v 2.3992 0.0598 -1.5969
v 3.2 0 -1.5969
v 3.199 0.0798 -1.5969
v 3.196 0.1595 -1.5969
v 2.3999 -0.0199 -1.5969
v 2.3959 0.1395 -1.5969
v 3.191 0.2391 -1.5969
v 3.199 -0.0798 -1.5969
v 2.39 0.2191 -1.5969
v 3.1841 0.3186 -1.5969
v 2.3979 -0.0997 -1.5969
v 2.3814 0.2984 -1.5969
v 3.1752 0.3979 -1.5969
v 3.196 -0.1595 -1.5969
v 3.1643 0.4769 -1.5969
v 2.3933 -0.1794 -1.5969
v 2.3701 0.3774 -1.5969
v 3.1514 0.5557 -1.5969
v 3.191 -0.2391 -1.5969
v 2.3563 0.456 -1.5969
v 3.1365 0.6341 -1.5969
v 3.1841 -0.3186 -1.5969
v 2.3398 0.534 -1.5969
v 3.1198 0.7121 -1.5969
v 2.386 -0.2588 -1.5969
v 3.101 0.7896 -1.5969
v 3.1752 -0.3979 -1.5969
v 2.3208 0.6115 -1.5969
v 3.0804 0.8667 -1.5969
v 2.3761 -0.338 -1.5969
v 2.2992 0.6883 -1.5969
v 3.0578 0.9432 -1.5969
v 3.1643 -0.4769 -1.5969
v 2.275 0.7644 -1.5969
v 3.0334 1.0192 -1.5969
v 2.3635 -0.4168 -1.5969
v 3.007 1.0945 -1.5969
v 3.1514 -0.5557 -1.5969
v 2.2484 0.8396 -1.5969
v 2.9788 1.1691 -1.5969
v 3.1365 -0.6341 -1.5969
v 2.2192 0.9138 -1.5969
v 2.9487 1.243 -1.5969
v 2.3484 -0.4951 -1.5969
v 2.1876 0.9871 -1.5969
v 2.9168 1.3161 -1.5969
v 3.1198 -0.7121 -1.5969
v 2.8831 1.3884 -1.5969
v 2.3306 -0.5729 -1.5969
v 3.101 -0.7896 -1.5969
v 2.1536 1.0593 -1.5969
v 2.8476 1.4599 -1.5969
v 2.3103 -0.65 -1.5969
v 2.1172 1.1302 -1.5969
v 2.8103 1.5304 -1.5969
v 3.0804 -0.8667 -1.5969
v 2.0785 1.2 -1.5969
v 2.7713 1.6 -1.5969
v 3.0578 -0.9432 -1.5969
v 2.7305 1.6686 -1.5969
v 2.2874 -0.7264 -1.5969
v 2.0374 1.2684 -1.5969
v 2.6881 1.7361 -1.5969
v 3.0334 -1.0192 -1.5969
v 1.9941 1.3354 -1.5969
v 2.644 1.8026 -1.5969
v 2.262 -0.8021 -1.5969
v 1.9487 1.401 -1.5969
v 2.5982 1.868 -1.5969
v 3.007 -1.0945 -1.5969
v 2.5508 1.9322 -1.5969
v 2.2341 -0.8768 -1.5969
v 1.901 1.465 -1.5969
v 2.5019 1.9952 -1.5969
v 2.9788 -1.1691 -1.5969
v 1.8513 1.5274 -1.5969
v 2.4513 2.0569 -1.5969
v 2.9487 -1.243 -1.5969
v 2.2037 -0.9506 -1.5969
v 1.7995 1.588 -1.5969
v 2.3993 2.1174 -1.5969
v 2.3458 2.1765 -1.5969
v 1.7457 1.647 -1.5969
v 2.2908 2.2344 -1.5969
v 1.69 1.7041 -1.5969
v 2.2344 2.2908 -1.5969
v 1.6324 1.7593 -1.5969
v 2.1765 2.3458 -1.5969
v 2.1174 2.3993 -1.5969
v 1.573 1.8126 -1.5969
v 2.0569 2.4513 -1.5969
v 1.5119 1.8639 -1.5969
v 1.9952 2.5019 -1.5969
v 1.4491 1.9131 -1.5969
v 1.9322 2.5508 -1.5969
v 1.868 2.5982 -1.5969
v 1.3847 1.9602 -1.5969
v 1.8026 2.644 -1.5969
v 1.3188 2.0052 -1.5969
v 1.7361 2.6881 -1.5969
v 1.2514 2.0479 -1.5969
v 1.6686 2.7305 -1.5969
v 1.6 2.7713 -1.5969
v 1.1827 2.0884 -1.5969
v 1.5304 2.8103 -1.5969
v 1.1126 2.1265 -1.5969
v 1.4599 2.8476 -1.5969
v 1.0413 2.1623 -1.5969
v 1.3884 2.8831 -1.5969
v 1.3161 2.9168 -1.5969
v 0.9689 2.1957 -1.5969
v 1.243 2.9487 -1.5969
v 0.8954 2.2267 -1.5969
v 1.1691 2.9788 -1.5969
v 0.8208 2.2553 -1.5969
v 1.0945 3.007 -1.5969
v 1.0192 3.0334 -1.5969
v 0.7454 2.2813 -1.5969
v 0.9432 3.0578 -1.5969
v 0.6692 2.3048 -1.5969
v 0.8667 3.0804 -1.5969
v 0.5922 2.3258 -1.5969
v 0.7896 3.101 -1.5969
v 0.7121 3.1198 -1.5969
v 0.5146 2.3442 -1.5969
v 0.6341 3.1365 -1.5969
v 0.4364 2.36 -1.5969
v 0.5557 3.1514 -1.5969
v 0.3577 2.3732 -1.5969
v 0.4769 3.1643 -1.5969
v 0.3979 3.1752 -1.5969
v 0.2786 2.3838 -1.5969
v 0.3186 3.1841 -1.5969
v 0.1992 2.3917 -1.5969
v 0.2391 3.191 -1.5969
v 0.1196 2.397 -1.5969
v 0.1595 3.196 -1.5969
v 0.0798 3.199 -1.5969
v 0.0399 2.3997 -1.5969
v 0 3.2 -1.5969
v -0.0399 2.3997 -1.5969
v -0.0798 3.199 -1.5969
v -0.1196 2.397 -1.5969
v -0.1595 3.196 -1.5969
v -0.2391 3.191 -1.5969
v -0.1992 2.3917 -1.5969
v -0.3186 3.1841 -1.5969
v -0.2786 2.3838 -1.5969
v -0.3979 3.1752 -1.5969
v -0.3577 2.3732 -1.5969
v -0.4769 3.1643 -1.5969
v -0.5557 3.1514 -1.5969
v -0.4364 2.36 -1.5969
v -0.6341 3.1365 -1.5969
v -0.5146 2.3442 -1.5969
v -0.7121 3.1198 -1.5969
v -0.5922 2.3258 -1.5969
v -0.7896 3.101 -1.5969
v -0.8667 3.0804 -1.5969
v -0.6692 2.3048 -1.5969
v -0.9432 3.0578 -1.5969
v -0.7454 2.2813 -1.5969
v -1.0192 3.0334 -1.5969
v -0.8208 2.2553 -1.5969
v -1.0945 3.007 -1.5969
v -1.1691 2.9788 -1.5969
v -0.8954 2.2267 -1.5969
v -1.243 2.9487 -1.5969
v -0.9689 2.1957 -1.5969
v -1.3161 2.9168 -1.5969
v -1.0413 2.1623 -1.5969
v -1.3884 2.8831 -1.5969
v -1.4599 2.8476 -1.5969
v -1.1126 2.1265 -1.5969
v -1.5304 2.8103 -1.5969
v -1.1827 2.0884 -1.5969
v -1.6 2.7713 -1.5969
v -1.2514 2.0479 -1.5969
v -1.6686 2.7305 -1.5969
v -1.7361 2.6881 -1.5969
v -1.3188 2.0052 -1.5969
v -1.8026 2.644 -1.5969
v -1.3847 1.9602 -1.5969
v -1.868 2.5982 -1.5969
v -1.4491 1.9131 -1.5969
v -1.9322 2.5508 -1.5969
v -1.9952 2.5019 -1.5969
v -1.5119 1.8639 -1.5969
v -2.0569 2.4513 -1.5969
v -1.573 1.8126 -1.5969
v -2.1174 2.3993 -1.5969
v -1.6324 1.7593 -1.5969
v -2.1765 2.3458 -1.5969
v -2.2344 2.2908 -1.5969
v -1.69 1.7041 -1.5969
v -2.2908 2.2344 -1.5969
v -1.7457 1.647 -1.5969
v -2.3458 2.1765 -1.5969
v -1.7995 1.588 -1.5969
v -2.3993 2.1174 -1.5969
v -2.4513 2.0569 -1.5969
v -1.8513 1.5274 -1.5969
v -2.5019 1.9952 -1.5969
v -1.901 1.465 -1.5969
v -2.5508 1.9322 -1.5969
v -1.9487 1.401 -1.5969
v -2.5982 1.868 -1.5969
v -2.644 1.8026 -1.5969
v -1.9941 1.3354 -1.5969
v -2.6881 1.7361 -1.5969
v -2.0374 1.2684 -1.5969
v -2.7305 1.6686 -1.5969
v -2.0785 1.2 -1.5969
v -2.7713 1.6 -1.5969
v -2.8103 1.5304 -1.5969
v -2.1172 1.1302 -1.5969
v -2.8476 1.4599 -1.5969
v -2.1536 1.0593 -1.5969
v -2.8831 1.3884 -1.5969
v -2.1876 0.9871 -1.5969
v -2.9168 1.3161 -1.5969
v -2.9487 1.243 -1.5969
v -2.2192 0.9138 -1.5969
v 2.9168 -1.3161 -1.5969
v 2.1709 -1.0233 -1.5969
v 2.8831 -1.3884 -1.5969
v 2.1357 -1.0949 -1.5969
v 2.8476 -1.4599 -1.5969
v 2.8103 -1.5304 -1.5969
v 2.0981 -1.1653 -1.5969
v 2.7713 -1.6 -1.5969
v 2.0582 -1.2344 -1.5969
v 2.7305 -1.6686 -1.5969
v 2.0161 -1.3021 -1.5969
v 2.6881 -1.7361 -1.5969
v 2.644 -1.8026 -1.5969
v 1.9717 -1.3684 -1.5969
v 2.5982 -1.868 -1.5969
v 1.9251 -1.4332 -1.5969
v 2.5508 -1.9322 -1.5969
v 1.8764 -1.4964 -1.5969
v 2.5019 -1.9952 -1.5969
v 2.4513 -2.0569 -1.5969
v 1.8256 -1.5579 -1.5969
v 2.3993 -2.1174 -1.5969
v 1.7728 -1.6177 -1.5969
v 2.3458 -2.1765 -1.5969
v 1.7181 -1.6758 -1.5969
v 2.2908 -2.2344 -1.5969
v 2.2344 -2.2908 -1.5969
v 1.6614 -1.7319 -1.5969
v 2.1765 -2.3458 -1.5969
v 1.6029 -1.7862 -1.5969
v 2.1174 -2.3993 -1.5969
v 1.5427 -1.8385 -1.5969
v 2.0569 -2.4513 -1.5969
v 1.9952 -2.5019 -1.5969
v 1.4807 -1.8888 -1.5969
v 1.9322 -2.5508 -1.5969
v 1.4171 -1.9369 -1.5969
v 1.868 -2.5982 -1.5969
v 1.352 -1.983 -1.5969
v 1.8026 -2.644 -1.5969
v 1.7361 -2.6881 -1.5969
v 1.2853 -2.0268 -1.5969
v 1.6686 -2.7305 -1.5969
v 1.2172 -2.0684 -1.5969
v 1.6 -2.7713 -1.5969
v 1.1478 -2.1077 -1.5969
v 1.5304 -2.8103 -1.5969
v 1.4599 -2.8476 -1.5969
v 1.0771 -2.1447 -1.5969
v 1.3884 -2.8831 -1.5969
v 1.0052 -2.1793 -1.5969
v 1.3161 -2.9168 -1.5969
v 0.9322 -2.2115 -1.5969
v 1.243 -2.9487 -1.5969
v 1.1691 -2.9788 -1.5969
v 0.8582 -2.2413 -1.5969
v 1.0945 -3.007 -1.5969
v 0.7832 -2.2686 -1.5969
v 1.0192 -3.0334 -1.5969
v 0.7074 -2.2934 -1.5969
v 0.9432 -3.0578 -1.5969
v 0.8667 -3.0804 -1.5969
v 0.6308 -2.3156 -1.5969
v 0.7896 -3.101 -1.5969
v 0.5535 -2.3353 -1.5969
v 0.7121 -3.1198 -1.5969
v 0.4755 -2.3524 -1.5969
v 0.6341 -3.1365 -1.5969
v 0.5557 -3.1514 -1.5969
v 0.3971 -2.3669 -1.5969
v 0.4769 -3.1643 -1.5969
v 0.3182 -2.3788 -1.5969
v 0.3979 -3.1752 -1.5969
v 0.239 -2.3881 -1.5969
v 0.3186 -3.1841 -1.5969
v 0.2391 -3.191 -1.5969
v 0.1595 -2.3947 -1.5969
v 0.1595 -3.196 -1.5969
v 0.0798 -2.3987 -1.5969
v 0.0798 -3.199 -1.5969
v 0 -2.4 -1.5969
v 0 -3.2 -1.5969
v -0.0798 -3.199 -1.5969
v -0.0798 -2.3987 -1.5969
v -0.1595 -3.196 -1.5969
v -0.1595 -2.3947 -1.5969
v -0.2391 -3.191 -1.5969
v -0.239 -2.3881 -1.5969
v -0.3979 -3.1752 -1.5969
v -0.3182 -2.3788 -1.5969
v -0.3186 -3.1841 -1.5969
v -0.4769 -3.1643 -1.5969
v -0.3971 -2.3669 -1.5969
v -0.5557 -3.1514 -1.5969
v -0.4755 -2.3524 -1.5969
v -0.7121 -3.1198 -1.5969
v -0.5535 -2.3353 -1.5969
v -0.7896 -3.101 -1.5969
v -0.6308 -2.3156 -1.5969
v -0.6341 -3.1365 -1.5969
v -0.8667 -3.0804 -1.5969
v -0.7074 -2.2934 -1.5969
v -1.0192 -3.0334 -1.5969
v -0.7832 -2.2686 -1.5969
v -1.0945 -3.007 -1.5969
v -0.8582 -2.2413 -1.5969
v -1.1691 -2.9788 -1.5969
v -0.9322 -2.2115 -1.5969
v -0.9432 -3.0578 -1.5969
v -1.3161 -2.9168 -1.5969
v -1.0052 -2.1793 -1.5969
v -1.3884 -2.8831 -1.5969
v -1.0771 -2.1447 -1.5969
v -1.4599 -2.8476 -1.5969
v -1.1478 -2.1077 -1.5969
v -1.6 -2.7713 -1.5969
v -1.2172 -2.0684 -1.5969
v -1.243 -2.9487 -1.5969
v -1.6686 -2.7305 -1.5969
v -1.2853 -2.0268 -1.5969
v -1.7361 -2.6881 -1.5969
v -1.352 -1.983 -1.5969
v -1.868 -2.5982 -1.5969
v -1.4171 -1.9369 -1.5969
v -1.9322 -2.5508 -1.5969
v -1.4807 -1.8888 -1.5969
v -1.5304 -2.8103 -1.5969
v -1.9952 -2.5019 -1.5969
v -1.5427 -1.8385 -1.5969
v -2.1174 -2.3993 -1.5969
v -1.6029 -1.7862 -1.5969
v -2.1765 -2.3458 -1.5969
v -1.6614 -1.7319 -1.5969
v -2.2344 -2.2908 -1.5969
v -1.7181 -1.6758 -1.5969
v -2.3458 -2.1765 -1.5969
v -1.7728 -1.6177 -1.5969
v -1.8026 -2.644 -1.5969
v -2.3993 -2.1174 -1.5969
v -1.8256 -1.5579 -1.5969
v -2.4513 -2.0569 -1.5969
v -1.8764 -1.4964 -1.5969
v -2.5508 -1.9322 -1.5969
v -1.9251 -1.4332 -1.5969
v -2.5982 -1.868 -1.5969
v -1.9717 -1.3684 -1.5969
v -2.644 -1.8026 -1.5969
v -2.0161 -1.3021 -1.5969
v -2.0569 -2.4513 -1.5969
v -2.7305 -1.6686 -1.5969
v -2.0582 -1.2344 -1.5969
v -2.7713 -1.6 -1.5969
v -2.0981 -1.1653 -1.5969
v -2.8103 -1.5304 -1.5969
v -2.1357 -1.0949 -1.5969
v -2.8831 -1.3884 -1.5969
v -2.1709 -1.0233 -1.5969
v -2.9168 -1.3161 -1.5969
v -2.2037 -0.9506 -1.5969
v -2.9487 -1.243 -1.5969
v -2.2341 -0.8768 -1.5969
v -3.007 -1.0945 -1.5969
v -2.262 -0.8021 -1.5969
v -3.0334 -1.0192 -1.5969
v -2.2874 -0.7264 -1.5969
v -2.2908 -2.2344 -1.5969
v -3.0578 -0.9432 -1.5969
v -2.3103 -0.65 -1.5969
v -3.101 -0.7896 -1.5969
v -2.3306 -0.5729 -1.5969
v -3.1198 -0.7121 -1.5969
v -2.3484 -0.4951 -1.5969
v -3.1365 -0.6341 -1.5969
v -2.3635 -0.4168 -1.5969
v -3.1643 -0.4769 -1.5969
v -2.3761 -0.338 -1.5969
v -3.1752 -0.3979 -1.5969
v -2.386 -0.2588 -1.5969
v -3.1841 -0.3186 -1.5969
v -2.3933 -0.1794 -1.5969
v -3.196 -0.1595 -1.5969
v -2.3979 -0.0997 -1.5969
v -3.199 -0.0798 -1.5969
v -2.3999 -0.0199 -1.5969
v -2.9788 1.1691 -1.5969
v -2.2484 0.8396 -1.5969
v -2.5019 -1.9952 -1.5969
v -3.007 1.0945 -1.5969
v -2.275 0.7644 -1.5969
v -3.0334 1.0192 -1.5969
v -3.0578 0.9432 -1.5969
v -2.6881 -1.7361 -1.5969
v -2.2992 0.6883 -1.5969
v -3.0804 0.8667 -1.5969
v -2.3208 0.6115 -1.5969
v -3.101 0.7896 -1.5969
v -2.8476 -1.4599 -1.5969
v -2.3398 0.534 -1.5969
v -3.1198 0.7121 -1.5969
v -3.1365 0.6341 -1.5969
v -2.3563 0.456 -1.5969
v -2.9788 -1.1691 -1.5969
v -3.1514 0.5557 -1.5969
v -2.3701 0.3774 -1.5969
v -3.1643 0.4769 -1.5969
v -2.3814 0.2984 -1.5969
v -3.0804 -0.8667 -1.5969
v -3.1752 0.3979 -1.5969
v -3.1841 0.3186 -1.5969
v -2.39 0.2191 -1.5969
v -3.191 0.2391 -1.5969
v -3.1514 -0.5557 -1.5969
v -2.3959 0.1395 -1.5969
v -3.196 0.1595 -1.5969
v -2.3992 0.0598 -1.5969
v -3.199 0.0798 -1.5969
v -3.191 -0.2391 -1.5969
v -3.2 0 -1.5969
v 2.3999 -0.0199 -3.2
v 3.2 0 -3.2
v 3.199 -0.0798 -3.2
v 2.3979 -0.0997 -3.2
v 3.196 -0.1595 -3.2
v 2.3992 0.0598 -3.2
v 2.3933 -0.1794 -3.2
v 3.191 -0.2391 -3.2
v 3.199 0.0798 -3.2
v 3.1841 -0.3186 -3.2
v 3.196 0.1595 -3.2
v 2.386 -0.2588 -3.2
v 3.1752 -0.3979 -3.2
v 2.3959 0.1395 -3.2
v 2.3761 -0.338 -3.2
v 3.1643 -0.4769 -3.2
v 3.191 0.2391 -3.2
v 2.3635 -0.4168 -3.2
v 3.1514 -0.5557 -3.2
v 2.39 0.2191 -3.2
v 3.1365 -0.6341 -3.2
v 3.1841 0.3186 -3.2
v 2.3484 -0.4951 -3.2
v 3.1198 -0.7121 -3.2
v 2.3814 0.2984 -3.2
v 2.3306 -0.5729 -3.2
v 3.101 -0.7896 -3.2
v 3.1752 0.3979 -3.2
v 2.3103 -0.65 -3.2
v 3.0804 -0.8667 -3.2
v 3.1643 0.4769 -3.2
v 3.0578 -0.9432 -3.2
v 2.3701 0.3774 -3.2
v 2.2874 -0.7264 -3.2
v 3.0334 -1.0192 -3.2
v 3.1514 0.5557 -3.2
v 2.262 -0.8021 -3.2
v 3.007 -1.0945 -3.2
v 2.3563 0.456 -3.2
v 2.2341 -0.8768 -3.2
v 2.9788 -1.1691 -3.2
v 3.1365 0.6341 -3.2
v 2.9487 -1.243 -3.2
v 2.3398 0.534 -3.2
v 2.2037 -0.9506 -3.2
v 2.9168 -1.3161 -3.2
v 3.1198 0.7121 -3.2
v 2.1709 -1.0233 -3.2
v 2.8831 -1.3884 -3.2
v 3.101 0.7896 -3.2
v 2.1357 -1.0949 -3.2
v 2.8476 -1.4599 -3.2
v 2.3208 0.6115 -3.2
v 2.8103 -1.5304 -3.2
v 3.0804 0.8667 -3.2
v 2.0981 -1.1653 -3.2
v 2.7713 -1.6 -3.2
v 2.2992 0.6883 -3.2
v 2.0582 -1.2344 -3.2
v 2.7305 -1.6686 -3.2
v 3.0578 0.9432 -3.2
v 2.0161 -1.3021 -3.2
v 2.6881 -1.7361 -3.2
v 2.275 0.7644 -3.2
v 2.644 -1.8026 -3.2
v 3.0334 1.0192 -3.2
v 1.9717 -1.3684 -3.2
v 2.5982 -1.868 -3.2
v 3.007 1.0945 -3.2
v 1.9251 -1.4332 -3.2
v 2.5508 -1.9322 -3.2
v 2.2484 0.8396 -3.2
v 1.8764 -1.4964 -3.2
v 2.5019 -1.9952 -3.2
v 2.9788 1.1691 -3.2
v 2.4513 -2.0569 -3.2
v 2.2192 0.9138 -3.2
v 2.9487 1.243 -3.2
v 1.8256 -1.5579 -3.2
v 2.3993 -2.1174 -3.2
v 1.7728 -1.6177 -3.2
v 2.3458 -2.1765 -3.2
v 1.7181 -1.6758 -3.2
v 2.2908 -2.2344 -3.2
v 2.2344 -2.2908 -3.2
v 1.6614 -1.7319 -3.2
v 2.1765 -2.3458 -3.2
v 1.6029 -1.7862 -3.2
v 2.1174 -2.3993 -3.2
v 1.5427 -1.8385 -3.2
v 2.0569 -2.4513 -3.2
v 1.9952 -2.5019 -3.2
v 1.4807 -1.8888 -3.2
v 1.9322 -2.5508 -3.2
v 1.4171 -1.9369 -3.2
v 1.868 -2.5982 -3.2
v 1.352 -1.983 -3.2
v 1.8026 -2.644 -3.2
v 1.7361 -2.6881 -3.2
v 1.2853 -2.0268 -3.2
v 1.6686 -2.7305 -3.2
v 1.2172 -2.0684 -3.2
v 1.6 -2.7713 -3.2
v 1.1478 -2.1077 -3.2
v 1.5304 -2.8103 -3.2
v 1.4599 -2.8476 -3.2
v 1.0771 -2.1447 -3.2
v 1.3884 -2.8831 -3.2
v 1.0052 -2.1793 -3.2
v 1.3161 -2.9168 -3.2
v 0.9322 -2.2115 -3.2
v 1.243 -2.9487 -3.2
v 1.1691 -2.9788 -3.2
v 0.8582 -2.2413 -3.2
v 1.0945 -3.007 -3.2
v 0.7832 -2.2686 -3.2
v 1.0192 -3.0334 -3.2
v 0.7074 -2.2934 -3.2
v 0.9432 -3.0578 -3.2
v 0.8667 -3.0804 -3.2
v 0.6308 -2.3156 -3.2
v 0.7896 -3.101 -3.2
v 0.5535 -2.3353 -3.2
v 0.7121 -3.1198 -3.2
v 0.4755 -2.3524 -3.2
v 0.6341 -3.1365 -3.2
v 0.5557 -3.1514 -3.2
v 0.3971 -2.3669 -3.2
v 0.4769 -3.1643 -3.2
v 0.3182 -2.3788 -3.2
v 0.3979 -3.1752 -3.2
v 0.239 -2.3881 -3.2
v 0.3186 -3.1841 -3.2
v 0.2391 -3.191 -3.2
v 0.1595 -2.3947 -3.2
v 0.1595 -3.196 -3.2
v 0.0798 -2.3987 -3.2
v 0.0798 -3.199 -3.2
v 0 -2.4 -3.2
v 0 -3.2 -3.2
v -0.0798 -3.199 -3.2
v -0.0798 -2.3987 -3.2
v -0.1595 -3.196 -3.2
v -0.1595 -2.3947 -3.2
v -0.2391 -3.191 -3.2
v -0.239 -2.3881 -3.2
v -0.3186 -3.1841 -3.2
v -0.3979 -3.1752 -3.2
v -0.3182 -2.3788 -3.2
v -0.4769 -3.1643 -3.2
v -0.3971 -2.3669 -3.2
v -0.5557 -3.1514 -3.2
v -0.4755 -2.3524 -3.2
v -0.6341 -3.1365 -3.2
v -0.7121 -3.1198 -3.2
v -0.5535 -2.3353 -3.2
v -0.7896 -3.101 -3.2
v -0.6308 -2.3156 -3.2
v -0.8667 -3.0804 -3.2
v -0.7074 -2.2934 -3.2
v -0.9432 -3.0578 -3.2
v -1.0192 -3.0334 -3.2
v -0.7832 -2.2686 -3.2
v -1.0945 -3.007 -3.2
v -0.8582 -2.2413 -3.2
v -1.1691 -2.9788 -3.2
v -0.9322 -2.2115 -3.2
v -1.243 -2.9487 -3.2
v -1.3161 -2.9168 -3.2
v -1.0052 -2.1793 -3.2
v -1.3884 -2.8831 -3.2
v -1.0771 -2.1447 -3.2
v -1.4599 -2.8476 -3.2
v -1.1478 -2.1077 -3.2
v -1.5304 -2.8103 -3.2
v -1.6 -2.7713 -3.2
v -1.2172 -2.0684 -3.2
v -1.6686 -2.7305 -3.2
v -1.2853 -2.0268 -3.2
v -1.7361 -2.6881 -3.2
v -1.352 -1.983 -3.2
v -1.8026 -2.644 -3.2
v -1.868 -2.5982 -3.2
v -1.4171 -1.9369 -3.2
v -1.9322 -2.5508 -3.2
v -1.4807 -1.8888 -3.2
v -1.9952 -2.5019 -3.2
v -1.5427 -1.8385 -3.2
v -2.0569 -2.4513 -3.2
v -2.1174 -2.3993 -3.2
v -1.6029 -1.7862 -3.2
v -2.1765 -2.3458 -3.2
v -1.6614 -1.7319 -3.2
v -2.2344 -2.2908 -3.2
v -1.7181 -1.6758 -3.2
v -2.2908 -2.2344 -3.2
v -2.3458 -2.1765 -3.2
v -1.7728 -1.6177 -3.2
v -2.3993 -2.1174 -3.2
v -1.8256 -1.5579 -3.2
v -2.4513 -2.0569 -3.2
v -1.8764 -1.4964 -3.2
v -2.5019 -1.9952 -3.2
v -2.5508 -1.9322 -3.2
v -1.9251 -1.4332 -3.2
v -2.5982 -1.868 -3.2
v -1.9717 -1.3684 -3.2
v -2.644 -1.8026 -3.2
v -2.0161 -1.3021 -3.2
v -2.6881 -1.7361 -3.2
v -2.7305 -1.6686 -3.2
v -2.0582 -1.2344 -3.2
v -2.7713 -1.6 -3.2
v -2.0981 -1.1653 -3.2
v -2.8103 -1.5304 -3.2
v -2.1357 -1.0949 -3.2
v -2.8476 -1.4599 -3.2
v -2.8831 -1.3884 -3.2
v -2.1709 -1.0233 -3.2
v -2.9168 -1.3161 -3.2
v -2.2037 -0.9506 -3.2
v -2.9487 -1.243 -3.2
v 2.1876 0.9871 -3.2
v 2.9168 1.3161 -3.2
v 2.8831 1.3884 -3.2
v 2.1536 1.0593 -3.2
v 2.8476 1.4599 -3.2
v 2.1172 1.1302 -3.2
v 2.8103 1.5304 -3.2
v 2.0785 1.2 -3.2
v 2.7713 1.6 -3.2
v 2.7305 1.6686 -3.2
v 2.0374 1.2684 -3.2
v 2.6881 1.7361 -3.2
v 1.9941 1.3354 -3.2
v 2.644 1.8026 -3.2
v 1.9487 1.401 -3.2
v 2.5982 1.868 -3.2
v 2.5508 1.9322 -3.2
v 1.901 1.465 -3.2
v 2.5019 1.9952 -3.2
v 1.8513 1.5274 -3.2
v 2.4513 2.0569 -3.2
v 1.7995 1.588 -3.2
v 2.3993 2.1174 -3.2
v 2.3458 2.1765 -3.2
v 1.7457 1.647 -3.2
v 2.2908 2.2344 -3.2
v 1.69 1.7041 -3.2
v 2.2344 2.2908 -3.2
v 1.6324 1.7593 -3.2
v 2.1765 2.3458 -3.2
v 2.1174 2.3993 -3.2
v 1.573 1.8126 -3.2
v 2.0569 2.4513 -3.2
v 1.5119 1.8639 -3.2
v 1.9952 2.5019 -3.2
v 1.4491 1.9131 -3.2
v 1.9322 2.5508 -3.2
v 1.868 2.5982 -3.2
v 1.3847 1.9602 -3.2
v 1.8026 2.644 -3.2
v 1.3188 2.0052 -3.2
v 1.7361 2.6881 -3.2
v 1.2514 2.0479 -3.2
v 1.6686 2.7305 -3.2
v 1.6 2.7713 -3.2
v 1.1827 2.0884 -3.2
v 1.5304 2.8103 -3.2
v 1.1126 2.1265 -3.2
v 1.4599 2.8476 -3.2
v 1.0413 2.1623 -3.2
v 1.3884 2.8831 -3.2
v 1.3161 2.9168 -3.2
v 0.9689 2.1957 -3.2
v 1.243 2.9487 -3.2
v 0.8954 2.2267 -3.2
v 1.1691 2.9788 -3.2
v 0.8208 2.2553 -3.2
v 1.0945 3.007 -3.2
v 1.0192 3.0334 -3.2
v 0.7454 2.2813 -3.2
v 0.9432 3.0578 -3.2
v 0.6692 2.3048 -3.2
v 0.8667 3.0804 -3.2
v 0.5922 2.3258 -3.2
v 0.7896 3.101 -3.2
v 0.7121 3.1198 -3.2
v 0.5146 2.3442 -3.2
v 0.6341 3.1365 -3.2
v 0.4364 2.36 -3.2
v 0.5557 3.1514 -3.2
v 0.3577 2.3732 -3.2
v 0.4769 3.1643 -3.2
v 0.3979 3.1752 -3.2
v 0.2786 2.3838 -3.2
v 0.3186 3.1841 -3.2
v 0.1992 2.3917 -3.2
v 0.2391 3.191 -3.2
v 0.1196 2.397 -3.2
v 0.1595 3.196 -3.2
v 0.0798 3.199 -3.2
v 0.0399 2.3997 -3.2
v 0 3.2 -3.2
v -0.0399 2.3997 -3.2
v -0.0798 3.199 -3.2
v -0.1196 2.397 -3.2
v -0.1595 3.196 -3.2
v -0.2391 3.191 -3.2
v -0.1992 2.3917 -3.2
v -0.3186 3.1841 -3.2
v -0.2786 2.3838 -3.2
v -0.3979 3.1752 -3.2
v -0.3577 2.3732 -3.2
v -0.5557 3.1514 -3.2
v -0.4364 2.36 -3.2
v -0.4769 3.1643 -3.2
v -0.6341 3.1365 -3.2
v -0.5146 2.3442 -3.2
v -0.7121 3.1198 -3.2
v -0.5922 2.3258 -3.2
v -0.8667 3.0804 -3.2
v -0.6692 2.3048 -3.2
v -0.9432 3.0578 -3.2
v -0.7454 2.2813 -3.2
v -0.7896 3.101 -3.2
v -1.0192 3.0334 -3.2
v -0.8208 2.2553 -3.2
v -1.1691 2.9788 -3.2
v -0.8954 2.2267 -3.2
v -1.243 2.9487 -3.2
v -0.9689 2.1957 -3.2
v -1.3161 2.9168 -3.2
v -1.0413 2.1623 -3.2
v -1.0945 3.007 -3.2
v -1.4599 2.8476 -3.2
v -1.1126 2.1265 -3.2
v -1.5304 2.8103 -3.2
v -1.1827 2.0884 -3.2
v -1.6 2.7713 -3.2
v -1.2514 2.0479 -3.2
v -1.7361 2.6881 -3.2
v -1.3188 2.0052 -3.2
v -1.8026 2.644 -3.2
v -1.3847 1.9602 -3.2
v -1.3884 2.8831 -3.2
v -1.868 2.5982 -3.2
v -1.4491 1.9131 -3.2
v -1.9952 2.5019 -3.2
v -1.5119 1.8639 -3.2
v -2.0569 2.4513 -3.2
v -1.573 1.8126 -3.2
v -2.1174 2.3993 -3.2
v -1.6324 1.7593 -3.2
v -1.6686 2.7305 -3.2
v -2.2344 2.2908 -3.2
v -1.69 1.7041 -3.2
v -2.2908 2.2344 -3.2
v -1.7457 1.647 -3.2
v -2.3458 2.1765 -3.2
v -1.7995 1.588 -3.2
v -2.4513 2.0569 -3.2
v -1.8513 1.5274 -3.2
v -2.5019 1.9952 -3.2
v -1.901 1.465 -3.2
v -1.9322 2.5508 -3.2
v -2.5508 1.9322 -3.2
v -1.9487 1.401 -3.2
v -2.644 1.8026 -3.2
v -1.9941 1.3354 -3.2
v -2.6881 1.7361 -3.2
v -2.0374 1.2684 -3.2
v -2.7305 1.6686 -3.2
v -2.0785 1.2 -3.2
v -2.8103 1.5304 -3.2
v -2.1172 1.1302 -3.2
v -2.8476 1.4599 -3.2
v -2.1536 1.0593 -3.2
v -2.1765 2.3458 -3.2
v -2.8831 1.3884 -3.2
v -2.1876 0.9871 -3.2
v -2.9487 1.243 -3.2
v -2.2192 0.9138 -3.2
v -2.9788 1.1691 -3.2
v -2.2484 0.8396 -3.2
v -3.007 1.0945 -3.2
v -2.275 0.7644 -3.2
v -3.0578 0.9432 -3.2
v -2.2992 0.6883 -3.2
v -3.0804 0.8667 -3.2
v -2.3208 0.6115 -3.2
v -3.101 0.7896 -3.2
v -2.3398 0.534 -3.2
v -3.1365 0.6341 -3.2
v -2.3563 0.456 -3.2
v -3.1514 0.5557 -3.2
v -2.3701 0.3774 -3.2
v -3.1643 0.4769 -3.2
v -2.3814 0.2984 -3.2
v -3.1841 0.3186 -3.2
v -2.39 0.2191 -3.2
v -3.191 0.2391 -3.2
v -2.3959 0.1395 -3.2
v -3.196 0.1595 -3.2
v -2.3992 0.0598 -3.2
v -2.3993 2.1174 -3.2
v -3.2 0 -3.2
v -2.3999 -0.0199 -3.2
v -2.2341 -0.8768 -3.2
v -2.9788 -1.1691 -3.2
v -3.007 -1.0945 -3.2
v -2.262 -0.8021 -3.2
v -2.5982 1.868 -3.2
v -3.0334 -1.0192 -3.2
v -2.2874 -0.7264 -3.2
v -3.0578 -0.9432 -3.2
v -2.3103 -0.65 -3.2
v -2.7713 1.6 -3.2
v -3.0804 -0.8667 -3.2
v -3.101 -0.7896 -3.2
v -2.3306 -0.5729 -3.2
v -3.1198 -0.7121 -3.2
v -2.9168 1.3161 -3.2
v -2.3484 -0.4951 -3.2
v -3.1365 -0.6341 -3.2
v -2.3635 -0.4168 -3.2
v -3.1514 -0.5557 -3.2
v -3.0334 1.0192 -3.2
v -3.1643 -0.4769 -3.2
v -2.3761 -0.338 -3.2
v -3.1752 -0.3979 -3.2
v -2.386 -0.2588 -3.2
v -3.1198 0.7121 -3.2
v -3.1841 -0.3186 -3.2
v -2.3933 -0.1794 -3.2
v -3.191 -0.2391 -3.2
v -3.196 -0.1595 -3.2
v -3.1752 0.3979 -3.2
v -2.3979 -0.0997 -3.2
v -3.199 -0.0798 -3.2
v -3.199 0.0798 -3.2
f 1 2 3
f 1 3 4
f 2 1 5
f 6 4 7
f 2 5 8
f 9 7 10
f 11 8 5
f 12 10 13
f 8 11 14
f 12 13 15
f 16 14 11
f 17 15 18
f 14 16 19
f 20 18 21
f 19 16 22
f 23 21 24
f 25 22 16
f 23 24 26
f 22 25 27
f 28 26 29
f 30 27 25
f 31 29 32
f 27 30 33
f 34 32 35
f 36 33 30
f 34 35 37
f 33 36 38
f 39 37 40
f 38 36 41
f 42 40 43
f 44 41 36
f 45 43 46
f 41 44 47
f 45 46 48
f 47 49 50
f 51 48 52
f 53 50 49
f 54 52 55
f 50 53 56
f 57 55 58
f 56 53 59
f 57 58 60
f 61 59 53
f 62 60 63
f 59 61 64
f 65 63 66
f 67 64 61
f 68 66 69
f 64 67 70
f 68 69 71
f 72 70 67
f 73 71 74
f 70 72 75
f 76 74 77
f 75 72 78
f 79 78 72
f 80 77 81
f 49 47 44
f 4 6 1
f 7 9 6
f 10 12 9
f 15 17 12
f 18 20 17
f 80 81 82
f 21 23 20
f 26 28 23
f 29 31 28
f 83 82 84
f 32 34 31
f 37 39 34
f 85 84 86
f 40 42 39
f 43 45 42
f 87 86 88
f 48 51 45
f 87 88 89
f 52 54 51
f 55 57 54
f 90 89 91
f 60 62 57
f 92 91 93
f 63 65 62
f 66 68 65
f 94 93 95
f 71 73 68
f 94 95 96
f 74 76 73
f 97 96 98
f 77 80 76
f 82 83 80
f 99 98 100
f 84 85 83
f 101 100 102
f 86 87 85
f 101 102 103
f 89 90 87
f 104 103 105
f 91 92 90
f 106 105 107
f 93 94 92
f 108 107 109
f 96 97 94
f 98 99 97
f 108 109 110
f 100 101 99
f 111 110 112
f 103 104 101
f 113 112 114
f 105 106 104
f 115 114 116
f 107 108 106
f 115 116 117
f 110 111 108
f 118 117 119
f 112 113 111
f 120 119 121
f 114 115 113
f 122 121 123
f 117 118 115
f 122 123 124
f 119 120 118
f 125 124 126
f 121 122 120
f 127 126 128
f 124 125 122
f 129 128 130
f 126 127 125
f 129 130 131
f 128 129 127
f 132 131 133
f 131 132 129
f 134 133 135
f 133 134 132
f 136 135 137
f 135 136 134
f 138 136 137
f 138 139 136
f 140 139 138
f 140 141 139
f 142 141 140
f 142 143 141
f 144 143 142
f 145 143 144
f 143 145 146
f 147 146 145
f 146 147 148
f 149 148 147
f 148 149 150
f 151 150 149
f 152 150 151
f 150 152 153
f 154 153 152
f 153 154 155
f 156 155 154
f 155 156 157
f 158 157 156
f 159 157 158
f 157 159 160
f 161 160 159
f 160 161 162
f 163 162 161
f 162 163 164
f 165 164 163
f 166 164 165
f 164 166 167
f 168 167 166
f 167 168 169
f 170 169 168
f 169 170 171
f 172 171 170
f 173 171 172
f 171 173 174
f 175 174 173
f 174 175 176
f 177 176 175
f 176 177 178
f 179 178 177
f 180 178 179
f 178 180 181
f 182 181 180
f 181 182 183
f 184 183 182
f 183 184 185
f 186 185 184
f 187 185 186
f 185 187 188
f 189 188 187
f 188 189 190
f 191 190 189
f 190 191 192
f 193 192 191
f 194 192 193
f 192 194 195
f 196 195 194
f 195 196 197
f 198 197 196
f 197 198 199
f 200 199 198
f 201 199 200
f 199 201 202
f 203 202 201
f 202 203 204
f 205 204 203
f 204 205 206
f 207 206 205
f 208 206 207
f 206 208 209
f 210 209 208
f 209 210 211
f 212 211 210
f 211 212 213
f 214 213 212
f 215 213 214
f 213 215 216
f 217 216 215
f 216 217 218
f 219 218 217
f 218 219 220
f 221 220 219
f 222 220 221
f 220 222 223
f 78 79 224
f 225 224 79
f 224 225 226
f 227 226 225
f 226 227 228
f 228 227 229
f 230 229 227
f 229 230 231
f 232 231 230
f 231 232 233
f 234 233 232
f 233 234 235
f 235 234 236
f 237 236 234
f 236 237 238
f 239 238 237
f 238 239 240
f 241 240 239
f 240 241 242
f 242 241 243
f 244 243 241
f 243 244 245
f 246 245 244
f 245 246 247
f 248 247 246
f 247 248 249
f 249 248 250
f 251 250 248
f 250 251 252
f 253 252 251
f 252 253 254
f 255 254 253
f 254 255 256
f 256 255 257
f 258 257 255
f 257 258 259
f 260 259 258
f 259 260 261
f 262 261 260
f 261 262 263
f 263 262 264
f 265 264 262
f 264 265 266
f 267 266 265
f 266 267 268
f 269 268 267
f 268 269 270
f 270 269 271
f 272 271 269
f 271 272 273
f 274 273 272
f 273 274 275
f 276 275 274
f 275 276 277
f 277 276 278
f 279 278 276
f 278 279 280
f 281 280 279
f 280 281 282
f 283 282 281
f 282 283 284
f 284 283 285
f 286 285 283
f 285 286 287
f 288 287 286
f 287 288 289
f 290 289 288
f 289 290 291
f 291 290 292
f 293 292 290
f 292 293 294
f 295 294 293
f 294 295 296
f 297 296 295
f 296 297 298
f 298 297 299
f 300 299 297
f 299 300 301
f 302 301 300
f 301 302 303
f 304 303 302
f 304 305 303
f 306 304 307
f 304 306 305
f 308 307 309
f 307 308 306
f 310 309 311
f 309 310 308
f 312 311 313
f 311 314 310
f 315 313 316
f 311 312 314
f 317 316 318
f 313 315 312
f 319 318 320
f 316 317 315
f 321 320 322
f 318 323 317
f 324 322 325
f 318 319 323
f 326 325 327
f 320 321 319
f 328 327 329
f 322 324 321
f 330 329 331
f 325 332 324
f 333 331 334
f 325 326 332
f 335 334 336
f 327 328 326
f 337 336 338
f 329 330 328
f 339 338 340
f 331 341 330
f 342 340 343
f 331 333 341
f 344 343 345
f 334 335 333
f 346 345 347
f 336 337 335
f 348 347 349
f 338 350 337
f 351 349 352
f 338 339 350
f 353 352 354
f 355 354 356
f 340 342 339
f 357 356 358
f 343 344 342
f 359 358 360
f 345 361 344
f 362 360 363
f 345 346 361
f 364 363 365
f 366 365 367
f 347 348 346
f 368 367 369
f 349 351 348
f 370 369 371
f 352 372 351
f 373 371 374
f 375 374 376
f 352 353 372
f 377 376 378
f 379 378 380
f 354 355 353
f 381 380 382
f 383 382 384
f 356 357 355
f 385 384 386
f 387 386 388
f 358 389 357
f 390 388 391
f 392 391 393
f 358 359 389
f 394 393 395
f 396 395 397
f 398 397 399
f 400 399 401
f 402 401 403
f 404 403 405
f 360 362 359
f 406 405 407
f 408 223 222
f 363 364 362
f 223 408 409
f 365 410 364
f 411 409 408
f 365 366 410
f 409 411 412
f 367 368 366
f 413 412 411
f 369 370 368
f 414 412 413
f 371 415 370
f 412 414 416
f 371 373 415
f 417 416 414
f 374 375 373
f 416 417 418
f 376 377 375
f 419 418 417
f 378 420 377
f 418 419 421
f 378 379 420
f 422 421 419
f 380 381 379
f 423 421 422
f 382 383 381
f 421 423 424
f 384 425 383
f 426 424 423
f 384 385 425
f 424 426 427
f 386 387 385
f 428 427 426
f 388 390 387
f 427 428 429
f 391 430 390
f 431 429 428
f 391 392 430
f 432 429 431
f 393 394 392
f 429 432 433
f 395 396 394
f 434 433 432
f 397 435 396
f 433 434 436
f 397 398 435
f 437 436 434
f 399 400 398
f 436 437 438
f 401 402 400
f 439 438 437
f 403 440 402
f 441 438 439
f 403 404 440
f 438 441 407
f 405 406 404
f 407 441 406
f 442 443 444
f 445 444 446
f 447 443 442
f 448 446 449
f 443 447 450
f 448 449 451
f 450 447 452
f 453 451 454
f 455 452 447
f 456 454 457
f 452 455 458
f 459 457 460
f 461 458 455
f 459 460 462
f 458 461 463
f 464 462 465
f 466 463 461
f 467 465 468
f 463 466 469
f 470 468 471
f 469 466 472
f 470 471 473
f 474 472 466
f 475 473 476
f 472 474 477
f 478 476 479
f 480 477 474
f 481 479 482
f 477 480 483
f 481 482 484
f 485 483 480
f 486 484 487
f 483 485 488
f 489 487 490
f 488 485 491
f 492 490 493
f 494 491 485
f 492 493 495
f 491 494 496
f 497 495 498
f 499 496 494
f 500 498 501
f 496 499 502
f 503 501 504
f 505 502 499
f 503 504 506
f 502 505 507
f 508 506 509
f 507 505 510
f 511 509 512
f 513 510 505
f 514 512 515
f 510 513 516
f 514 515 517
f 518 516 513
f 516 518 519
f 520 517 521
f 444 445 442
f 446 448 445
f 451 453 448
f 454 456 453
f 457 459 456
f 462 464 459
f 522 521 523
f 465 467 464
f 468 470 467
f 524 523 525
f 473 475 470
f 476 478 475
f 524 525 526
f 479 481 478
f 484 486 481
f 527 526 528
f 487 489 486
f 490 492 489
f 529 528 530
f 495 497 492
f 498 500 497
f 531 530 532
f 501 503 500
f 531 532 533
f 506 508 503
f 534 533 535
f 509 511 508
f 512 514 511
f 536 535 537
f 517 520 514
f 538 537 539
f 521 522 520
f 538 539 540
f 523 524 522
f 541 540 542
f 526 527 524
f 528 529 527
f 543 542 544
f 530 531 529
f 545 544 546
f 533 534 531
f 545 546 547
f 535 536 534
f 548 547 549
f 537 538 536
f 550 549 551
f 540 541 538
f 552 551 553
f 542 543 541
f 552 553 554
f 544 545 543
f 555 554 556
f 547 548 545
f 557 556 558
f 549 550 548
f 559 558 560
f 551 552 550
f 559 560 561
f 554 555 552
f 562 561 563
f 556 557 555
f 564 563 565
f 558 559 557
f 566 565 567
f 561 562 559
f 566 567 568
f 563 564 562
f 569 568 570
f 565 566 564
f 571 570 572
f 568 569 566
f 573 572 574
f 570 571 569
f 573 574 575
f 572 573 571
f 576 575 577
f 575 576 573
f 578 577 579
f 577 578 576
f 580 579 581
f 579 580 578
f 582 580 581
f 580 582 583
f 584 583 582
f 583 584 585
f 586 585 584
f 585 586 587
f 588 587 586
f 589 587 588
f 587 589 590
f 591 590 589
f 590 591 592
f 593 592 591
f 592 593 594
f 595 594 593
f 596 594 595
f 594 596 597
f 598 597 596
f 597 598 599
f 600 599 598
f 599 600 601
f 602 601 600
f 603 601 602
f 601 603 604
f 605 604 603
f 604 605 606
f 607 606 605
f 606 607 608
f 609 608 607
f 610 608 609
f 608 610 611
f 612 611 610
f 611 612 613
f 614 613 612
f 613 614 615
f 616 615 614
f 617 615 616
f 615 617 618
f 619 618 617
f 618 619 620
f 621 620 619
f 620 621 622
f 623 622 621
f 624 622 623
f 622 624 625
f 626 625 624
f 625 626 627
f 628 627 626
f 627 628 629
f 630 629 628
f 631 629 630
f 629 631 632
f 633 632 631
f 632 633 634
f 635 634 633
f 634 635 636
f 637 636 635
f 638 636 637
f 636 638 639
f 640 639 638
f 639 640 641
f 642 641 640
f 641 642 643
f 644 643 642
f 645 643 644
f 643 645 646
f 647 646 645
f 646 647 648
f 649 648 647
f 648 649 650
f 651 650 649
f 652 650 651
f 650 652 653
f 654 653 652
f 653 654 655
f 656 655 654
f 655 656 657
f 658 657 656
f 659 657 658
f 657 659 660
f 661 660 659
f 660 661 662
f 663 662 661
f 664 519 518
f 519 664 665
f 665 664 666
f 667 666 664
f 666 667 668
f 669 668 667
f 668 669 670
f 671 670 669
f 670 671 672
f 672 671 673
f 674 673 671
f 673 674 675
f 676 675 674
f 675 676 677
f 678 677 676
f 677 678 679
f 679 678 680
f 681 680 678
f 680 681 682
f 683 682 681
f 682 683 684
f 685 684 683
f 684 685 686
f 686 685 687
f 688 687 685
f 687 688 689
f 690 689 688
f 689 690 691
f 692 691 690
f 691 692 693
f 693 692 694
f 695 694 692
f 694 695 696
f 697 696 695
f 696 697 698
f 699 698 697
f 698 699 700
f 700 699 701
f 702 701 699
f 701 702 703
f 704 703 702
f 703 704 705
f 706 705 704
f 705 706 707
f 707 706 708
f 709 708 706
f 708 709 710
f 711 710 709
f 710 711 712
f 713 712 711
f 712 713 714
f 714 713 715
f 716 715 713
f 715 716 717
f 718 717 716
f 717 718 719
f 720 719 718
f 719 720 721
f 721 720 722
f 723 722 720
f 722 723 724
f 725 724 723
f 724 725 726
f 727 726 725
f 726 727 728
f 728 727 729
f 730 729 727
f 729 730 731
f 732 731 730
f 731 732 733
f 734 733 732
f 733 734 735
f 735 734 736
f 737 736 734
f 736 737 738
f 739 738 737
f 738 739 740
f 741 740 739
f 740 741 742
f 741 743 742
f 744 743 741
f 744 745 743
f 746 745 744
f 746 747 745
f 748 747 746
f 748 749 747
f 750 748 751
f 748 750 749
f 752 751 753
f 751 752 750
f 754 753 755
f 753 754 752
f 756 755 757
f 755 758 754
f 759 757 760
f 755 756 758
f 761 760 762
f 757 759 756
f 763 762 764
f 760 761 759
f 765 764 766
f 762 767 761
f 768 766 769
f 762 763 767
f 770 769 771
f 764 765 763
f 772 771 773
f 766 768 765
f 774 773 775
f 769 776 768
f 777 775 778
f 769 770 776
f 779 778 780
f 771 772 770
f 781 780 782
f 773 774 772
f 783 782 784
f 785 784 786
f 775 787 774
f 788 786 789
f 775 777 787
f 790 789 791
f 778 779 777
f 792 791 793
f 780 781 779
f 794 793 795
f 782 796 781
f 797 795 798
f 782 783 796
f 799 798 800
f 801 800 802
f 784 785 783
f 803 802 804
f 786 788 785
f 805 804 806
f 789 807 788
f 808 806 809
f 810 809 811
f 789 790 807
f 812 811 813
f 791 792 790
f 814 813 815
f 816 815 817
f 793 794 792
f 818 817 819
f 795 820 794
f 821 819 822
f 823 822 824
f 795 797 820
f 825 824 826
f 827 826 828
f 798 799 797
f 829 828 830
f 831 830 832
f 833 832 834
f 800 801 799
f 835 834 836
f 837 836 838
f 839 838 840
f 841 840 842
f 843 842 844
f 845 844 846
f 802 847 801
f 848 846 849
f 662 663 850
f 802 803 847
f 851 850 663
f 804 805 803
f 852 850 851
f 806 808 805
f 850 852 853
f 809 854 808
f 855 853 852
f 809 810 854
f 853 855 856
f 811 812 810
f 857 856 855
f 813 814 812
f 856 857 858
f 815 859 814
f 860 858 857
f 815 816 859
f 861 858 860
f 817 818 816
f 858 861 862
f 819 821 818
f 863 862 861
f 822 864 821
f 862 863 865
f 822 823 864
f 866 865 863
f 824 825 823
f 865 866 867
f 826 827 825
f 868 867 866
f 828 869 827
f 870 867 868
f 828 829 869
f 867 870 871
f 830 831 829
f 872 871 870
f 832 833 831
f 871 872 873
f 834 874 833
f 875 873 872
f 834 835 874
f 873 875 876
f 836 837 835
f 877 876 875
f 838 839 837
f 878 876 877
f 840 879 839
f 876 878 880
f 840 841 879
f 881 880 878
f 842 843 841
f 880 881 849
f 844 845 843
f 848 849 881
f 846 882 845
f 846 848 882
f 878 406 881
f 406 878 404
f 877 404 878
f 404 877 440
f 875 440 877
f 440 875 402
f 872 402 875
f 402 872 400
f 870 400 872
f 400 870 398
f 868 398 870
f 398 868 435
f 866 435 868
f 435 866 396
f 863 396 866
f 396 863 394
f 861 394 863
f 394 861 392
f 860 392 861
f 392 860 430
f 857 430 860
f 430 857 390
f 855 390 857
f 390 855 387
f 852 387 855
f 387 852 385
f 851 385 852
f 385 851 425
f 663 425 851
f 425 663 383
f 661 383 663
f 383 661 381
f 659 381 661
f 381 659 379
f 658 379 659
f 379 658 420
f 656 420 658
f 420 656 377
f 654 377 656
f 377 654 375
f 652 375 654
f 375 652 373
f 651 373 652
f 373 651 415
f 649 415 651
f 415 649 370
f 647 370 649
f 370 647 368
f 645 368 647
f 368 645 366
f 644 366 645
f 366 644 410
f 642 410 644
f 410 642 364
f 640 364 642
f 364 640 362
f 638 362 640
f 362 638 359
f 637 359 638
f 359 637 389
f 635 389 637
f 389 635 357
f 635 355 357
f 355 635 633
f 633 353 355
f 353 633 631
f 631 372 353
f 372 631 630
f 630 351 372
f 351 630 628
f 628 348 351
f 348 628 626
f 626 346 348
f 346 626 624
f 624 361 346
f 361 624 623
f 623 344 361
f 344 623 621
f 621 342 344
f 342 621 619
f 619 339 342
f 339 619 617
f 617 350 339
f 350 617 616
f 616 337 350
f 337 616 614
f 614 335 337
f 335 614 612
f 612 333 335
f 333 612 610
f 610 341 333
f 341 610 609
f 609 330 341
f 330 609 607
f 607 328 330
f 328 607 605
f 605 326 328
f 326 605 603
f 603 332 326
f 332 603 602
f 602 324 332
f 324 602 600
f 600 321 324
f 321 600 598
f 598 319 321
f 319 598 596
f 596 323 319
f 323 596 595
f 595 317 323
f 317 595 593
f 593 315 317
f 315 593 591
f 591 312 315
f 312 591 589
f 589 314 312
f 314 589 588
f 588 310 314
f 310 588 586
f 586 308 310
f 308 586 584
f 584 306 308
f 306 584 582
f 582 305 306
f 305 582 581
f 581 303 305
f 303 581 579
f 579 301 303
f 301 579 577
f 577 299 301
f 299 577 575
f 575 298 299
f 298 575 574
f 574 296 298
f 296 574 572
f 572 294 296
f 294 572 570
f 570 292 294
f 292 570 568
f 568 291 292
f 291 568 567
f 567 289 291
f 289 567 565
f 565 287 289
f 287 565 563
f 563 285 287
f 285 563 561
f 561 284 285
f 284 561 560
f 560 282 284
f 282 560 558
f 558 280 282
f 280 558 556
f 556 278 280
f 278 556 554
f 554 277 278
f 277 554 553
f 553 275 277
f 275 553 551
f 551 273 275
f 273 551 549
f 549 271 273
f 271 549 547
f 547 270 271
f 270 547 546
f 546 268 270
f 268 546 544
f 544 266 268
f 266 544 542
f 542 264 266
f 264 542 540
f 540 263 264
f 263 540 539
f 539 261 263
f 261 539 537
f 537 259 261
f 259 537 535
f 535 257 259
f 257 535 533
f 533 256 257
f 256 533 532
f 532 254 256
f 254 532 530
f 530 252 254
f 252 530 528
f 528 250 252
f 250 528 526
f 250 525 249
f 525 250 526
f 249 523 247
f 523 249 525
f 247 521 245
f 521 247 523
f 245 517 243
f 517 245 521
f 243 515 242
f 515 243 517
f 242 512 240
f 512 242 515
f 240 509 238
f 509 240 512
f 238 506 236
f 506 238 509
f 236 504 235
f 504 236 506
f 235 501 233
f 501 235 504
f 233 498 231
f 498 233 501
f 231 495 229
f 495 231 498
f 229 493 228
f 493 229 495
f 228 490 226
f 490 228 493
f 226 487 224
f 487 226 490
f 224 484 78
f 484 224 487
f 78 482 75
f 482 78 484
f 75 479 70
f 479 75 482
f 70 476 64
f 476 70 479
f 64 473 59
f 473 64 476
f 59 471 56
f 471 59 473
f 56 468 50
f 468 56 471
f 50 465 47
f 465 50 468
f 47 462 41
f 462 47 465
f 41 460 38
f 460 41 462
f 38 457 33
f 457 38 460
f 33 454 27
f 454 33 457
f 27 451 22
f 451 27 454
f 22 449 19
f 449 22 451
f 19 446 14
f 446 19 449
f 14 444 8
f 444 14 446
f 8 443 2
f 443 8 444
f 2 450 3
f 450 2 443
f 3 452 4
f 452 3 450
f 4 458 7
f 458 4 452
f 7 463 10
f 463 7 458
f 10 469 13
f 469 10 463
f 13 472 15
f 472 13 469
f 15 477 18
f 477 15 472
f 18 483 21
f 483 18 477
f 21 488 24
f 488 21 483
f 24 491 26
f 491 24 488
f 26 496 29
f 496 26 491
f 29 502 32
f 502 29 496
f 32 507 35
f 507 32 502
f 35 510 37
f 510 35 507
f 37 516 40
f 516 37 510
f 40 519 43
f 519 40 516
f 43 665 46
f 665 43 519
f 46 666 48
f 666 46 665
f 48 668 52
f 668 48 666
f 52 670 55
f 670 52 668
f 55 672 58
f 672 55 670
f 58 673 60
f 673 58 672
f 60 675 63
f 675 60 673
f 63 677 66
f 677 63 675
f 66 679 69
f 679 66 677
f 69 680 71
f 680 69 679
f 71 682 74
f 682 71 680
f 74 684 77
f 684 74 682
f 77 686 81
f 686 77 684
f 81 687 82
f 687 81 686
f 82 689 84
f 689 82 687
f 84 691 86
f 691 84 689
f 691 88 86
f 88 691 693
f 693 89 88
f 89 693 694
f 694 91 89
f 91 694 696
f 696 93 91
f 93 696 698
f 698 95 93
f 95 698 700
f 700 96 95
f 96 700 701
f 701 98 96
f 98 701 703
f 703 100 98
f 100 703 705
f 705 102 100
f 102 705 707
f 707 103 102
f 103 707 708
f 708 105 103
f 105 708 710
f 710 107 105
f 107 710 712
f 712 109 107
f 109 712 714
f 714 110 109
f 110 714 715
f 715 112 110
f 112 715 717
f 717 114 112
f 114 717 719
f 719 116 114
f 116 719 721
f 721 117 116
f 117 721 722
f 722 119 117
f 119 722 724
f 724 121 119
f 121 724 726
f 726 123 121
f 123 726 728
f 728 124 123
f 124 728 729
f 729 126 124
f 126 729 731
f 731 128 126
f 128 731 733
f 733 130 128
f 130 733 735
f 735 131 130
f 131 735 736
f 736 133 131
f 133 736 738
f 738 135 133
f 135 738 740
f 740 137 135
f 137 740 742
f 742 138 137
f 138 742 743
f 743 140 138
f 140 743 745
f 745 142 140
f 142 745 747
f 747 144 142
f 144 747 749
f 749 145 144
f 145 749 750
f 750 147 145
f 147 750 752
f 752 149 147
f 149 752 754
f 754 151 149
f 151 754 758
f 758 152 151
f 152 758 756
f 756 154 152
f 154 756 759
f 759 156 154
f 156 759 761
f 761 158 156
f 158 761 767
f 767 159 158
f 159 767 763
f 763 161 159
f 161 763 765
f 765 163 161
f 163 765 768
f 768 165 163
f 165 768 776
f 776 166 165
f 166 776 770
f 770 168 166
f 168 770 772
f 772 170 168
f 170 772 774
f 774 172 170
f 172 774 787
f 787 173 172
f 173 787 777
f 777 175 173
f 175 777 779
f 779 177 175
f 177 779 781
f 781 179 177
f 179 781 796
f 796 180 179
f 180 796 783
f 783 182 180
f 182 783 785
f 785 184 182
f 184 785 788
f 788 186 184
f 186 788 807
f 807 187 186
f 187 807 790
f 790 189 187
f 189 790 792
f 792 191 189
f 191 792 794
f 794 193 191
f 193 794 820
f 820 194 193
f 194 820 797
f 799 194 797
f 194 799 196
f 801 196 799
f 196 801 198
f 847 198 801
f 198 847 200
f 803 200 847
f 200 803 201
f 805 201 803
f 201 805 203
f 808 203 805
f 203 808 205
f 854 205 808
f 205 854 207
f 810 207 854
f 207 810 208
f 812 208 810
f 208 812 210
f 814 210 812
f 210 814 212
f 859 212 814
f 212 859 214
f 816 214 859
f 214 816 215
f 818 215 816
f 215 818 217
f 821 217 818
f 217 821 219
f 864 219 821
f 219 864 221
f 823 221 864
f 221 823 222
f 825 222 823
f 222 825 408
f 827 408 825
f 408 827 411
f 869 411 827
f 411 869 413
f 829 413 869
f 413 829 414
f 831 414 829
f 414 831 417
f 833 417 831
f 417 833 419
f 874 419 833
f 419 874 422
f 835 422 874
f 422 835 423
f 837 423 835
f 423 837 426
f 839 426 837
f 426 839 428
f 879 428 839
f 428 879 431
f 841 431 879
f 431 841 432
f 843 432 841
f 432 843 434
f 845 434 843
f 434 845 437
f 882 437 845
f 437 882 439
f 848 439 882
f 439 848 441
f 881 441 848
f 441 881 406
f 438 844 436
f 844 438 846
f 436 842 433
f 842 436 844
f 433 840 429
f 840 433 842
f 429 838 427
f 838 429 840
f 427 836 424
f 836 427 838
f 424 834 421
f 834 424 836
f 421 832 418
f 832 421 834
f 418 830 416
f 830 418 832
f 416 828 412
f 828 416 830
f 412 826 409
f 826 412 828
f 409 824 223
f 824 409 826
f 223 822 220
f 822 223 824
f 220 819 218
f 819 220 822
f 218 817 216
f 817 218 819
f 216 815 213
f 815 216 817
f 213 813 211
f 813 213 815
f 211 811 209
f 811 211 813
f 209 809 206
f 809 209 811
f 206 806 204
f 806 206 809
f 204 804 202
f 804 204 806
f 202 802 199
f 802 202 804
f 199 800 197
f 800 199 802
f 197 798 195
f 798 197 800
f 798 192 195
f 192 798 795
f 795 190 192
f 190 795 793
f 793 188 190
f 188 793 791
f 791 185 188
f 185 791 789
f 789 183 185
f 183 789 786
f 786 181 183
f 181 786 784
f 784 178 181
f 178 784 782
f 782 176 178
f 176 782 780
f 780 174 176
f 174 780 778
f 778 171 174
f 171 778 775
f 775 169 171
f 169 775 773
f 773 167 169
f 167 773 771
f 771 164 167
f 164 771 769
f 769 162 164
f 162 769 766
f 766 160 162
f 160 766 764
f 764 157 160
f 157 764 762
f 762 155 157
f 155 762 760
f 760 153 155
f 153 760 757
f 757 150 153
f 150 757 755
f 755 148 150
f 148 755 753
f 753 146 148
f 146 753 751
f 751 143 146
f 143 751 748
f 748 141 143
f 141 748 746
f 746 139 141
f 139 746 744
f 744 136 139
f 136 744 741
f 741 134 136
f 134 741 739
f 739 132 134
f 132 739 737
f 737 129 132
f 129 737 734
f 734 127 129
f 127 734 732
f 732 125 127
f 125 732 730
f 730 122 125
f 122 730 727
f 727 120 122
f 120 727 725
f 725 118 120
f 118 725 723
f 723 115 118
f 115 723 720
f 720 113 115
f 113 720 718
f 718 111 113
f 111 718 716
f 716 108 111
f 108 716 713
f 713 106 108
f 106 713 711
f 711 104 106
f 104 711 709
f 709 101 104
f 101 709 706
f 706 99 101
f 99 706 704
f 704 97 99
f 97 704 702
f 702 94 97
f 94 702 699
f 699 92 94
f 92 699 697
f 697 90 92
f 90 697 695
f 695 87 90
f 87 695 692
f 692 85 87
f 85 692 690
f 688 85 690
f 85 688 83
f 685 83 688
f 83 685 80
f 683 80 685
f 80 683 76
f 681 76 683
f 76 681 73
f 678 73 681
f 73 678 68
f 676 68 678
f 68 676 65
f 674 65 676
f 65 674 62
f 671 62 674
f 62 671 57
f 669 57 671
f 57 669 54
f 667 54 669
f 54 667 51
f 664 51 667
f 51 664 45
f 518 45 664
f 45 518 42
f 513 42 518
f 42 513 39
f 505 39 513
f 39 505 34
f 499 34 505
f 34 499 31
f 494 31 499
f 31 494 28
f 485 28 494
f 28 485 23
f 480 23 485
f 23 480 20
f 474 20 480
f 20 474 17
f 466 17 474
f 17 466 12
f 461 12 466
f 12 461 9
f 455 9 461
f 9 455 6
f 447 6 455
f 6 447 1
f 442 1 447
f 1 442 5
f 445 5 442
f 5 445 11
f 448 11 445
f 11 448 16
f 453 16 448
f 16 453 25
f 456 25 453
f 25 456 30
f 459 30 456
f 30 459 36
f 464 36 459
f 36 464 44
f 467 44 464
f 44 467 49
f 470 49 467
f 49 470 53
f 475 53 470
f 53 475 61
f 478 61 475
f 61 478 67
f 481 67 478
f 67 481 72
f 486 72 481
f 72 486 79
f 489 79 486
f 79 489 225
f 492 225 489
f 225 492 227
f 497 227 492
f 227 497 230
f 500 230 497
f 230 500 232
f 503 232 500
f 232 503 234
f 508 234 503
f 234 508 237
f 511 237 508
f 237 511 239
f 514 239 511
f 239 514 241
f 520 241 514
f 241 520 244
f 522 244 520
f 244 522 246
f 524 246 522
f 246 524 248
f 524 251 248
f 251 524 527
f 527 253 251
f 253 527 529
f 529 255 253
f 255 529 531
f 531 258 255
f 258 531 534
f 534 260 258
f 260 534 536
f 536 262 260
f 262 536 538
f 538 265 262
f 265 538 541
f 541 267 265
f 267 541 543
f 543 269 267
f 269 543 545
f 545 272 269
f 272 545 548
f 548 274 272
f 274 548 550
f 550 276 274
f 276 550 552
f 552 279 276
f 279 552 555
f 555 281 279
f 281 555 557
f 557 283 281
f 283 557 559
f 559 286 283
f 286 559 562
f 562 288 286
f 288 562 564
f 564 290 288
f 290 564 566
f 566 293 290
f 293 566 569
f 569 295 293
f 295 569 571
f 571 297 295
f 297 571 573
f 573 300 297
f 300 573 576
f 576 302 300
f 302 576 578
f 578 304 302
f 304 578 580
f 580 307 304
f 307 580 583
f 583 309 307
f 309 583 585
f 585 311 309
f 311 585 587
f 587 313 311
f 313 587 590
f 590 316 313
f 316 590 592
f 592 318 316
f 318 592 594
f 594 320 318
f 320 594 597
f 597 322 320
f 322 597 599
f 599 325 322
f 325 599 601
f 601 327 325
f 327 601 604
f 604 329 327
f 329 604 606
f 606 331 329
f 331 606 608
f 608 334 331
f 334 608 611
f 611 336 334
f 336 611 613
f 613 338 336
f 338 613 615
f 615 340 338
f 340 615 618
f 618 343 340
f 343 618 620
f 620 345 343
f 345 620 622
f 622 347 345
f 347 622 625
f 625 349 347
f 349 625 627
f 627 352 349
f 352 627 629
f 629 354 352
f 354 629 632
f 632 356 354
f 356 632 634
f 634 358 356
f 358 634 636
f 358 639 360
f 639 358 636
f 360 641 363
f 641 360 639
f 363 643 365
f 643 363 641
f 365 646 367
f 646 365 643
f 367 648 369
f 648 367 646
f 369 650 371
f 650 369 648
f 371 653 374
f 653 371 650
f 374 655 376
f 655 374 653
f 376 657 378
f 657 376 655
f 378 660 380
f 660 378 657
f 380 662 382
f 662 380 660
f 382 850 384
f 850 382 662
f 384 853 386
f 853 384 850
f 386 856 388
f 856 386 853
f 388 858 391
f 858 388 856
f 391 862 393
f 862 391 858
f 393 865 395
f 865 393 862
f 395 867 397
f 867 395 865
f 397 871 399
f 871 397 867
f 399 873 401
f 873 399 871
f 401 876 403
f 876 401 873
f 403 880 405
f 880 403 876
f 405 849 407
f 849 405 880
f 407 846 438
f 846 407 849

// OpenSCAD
use <../lib.scad>
use <14769p01.scad>
$fa=1; $fs=0.2;
function ldraw_lib__16424(realsolid=false) = [
// 0 =Tile  2 x  2 Round with Round Underside Stud and Black Eye Pattern
// 0 Name: 16424.dat
// 0 Author: Rolf Osterthun [Rolf]
// 0 !LDRAW_ORG Part Alias UPDATE 2016-01
// 0 !LICENSE Licensed under CC BY 2.0 and CC BY 4.0 : see CAreadme.txt
// 
// 0 BFC CERTIFY CW
  [0,"BFC","CERTIFY"],
  [0,"BFC","CW"],
// 
// 0 !HISTORY 2016-12-31 [PTadmin] Official Update 2016-01
// 
// 
// 0 // Alias of 14769p01
// 
// 1 16 0 0 0 1 0 0 0 1 0 0 0 1 14769p01.dat
  [1,16,0,0,0,1,0,0,0,1,0,0,0,1, ldraw_lib__14769p01(realsolid)],
];
module ldraw_lib__16424(step=0, col=false, unit=2/5, alt=false, line=0.2, solid=!$preview)
    makepoly(ldraw_lib__16424(solid), step=step, col=col, unit=unit, alt=alt, line=line, solid=solid);
ldraw_lib__16424(line=0.2);
